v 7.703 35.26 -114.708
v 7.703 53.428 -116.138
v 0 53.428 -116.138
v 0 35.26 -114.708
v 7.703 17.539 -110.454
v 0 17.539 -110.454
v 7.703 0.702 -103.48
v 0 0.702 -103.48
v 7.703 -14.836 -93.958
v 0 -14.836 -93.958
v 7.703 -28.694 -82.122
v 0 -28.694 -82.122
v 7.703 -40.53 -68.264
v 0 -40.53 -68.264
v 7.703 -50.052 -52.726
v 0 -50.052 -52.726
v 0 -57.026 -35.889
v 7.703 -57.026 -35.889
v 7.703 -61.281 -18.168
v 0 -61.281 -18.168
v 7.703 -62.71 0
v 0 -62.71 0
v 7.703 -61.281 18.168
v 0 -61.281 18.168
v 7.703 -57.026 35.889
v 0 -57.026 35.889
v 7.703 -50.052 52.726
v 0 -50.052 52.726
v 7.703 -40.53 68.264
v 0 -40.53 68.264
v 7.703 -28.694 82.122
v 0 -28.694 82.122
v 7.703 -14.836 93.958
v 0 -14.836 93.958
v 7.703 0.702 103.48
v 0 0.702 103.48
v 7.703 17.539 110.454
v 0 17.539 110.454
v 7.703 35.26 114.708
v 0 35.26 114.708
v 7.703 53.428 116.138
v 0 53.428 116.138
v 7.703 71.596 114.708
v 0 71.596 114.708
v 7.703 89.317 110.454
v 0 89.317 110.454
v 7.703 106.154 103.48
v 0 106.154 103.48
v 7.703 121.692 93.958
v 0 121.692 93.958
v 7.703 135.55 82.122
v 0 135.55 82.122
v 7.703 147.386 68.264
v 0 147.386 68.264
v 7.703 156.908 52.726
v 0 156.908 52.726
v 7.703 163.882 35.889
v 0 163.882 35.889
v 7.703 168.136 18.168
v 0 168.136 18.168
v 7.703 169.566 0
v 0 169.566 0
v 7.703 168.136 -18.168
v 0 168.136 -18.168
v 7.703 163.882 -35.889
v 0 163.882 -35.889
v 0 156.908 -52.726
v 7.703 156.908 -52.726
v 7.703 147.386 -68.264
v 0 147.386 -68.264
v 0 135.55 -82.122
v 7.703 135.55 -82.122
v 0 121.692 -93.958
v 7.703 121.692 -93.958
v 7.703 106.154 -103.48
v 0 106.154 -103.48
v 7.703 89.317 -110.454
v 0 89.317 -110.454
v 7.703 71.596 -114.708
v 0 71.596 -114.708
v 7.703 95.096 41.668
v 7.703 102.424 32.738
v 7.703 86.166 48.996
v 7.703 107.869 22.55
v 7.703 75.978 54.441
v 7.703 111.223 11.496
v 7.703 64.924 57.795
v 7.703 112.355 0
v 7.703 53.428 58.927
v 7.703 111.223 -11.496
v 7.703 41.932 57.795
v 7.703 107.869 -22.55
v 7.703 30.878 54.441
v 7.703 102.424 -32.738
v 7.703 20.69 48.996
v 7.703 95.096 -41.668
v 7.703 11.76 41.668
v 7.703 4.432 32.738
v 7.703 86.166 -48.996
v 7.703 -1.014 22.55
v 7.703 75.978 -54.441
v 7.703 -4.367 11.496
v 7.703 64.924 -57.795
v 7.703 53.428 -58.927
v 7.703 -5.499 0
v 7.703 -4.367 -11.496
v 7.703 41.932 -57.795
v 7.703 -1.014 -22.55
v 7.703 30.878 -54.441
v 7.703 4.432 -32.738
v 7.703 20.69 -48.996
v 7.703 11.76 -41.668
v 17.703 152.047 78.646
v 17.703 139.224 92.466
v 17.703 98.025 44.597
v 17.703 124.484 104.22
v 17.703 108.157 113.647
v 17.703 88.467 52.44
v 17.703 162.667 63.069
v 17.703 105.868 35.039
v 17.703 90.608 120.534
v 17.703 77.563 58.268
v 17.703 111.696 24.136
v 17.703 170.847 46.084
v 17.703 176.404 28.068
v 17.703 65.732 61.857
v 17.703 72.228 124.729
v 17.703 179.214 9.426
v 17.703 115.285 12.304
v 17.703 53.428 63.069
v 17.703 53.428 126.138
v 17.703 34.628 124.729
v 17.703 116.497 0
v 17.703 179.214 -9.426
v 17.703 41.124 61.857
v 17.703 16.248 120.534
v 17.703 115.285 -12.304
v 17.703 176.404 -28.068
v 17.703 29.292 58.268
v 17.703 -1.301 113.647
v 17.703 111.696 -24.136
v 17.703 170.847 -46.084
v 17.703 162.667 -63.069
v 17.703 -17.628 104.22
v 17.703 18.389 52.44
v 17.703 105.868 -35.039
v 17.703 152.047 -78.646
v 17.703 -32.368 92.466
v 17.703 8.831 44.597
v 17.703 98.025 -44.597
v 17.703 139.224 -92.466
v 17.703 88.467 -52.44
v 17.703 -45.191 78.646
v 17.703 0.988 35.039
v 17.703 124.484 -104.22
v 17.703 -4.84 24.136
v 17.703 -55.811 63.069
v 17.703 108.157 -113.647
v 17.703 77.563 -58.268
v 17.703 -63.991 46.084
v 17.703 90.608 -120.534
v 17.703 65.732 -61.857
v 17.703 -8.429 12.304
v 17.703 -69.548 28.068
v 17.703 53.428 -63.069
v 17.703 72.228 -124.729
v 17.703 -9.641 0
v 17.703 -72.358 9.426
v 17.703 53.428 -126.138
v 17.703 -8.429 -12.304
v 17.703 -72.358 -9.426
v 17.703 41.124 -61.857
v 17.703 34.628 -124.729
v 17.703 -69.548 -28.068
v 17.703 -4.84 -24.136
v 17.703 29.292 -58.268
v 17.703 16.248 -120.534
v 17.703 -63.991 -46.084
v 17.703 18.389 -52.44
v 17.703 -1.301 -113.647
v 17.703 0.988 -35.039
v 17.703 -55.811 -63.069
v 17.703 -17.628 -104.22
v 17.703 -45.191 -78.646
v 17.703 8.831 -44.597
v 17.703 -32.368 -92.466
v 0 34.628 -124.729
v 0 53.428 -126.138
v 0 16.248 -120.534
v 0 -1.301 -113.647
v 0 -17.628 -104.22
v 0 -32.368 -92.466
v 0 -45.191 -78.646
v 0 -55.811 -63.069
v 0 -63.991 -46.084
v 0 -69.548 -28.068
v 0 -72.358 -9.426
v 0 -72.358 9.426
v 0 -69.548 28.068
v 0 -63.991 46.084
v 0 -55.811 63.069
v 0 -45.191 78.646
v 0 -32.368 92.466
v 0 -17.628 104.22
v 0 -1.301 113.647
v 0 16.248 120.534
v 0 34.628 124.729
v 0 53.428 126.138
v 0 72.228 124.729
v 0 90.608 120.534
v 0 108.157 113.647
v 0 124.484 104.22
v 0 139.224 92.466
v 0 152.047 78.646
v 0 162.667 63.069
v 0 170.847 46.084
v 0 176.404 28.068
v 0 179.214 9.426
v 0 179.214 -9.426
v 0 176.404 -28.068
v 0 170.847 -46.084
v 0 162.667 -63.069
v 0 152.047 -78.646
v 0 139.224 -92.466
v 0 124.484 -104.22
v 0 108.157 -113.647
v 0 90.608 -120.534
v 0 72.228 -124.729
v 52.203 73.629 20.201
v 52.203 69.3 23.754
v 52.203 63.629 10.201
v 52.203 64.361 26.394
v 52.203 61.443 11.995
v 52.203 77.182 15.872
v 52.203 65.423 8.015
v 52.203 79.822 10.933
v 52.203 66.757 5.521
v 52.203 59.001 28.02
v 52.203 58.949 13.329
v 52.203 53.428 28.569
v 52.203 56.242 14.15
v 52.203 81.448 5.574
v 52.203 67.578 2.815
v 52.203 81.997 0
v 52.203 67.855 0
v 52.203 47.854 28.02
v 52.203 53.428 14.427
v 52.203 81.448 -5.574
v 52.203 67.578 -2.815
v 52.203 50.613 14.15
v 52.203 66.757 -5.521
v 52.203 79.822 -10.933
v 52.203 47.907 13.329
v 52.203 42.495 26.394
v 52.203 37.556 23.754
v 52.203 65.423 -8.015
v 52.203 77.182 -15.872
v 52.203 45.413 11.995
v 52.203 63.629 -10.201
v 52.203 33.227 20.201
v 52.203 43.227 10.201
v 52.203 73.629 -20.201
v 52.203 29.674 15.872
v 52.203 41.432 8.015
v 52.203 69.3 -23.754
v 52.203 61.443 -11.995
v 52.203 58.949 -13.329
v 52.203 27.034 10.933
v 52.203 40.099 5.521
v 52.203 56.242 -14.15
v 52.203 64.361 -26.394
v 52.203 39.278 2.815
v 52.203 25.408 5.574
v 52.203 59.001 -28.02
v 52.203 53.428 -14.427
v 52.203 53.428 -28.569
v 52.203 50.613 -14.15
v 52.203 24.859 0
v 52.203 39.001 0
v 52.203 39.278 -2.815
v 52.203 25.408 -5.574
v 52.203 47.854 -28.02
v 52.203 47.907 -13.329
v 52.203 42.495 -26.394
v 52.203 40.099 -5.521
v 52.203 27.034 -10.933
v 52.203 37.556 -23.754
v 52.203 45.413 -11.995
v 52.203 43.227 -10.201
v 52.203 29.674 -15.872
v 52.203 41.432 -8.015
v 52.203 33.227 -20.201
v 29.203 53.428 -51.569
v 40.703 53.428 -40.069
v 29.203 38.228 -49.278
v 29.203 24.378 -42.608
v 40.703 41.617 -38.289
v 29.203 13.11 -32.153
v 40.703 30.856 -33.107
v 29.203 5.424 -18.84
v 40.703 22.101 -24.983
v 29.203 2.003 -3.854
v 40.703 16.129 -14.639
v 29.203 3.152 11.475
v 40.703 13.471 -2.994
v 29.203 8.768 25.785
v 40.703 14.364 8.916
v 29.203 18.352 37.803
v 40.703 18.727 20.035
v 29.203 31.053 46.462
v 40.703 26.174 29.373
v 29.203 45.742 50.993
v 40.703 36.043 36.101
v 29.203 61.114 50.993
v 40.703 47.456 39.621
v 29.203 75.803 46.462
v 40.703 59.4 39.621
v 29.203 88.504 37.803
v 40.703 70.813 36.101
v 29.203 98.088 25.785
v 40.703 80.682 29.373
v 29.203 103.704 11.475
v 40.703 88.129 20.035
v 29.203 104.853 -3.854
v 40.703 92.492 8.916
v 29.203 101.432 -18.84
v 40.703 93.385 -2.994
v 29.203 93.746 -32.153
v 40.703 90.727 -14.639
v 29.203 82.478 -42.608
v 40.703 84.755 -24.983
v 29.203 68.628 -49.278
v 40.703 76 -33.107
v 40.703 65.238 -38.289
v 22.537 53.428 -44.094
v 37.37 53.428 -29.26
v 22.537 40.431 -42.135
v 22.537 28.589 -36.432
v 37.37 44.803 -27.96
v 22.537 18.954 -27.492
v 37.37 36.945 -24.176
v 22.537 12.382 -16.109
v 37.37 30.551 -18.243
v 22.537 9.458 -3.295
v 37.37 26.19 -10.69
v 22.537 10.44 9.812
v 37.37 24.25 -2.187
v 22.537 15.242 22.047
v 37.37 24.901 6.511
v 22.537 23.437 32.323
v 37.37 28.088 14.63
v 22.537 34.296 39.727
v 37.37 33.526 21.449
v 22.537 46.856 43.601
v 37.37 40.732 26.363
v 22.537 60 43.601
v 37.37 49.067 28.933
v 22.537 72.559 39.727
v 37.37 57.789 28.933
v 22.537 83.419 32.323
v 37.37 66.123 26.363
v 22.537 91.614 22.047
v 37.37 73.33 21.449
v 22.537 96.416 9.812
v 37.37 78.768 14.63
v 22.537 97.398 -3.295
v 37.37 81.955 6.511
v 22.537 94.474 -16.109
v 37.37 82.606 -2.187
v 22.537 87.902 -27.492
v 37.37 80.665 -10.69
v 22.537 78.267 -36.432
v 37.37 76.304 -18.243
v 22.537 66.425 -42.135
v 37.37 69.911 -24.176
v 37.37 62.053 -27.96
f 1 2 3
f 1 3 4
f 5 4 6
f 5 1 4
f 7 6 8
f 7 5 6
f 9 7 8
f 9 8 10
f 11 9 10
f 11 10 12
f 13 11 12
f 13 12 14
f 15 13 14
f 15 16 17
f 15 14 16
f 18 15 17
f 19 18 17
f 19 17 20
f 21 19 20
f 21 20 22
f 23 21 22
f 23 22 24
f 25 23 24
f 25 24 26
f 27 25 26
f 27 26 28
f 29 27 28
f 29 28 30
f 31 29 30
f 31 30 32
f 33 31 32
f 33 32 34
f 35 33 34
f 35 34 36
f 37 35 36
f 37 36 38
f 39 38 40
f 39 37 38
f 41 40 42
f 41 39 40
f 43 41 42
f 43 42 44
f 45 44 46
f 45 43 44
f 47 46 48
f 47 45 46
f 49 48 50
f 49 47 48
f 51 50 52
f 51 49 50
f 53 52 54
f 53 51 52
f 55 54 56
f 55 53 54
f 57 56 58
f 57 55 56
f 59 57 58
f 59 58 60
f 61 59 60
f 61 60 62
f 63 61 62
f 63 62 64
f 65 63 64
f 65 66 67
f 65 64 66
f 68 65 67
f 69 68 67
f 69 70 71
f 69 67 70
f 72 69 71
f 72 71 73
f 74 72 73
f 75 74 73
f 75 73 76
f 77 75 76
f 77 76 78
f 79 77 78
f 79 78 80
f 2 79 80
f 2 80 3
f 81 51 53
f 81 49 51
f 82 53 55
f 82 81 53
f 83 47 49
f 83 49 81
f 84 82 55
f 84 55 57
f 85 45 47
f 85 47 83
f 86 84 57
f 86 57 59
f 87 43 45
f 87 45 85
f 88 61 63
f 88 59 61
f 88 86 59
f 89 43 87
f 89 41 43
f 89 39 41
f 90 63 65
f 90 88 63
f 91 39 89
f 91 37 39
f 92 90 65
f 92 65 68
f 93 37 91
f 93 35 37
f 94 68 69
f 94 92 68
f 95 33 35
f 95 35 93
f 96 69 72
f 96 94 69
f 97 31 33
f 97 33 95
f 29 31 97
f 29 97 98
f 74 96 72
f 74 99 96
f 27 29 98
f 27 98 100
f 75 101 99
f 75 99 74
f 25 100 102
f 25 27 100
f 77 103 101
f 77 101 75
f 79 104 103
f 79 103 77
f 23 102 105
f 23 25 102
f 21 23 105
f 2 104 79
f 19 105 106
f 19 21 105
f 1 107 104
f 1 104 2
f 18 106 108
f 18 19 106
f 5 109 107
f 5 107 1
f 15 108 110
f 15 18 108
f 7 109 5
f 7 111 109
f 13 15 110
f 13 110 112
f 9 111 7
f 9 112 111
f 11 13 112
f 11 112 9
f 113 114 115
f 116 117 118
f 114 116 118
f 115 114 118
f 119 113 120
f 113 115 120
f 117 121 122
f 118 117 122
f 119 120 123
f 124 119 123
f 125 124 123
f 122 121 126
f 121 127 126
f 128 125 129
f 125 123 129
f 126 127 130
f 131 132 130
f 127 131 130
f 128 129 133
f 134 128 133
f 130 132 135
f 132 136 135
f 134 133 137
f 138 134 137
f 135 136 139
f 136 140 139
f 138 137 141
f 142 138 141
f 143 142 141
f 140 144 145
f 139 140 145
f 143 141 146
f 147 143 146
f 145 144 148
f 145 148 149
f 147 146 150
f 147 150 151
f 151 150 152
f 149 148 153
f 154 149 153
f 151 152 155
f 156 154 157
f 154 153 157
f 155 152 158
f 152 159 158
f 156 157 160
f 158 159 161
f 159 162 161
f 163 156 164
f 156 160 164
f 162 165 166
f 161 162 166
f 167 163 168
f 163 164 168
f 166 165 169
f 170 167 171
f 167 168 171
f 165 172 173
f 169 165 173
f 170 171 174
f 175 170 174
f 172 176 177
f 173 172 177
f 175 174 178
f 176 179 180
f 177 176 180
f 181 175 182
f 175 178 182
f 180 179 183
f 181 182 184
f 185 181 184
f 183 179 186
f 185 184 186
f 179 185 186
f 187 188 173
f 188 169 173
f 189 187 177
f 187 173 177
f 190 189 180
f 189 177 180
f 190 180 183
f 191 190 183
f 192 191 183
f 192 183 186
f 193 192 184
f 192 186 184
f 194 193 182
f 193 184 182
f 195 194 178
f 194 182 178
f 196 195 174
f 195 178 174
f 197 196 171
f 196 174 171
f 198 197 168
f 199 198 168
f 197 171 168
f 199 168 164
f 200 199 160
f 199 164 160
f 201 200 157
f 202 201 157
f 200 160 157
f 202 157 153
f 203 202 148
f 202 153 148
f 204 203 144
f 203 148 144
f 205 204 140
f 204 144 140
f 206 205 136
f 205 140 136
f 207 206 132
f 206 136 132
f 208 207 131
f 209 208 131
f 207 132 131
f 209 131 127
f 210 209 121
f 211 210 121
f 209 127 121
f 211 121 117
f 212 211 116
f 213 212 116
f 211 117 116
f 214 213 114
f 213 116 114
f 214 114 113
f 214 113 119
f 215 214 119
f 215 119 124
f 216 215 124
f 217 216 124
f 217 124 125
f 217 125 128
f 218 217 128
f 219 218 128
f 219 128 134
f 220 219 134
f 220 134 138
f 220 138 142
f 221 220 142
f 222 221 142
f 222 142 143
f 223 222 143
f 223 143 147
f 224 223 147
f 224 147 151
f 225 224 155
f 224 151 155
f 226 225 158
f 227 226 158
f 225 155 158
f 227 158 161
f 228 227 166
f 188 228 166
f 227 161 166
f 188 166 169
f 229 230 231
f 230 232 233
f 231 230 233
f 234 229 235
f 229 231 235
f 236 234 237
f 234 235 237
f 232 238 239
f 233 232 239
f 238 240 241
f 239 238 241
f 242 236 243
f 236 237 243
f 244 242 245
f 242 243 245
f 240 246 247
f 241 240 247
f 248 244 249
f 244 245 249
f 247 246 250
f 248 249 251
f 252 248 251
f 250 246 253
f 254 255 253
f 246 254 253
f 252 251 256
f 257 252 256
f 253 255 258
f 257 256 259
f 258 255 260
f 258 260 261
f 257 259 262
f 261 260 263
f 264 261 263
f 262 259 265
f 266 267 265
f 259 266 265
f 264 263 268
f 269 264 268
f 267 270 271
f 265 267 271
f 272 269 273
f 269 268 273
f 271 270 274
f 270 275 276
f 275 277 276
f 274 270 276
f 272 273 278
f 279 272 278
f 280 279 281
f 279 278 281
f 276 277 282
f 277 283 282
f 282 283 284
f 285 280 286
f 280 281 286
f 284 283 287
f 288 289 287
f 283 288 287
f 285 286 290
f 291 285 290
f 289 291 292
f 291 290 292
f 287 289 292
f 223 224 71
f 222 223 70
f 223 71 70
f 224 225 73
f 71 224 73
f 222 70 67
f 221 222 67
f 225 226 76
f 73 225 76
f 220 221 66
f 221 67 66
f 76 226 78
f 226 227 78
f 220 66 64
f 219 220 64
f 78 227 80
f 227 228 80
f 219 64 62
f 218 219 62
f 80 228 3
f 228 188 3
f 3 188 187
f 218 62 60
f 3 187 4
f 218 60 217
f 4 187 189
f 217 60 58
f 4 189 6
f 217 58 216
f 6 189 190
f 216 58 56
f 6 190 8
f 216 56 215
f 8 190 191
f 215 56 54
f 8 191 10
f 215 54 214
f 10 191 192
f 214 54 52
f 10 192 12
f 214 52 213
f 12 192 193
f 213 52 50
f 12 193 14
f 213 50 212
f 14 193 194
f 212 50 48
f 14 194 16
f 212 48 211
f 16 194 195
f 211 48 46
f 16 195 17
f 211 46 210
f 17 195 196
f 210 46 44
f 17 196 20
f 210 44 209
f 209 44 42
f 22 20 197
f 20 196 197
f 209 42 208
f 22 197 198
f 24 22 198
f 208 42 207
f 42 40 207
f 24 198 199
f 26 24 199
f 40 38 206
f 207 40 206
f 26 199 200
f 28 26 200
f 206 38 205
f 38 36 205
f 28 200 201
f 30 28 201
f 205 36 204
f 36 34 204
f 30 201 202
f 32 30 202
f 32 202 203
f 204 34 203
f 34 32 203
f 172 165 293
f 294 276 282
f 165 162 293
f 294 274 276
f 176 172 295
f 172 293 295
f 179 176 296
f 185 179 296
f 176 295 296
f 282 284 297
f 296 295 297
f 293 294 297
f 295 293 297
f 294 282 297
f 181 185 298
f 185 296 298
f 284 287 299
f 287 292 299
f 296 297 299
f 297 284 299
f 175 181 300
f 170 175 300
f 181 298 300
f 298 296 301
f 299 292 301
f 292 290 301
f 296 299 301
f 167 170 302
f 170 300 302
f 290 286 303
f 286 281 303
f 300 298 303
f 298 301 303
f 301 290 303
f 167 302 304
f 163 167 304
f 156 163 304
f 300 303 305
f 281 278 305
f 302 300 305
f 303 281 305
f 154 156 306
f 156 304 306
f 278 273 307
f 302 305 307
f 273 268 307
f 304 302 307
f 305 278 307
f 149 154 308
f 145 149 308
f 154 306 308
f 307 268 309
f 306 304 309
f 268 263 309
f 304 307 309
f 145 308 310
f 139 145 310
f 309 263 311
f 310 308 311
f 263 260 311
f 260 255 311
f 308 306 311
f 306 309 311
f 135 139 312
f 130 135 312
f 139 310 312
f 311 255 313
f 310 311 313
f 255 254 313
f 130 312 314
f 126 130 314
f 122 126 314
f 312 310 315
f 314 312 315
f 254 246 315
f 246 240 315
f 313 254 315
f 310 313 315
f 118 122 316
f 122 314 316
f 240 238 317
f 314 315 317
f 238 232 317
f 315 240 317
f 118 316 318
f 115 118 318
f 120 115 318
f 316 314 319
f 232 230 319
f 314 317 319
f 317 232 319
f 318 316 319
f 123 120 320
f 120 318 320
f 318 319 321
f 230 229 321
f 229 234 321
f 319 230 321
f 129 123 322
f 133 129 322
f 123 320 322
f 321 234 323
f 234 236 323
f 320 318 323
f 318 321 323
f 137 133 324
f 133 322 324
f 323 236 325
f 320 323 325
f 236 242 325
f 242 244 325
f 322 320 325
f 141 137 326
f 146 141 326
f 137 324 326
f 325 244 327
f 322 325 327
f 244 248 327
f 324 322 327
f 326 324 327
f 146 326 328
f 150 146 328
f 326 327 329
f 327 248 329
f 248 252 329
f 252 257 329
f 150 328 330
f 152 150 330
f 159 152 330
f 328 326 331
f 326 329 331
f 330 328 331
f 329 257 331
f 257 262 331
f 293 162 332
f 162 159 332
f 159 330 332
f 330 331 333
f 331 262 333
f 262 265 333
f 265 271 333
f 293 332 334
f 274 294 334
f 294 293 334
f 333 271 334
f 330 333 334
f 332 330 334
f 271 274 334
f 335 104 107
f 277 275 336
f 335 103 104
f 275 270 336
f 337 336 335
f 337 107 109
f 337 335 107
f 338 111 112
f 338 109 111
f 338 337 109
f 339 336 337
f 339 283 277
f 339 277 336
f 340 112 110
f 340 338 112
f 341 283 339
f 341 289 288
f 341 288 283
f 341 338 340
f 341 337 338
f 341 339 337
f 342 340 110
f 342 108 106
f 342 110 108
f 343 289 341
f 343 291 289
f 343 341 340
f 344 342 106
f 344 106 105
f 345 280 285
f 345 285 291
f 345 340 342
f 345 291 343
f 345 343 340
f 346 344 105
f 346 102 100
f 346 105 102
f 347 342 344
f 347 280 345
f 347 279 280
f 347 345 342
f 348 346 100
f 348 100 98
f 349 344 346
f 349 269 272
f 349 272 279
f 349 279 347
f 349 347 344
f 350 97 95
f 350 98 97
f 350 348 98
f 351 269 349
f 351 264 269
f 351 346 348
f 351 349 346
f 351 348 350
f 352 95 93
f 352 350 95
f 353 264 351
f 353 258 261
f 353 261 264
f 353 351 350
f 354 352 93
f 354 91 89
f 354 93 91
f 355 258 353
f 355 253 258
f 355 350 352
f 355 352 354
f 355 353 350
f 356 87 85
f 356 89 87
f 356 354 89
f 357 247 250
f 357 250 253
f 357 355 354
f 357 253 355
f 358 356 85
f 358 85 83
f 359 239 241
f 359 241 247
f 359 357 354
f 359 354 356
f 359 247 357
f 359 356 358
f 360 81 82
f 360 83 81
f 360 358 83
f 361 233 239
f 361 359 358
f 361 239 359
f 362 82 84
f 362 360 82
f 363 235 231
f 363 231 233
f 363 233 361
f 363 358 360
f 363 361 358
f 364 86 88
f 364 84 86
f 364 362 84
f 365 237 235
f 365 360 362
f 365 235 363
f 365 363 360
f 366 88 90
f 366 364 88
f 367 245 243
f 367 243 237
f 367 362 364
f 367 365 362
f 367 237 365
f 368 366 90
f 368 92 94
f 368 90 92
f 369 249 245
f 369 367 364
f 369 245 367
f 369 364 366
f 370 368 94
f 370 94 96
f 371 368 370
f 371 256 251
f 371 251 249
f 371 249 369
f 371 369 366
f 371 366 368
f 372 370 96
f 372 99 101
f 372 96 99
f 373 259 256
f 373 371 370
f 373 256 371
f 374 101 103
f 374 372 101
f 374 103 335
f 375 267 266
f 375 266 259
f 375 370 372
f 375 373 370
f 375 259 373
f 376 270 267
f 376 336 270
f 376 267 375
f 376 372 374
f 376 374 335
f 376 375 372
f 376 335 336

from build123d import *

# Parameters (mm, degrees)
VACIADO1_T = -10


with BuildPart() as part:
    # Croquis1 → Revolución1 (revolve)
    with BuildSketch(Plane.XY, mode=Mode.PRIVATE) as revoluci_n1_sk:
        Polygon((0, 53.427911052), (0, -72.710427761), (17.703234608, -72.710427761), (17.703234608, -9.641258354), (52.203454236, 24.858961274), (52.203454236, 53.427911052), align=None)
    revolve(revoluci_n1_sk.sketch.rotate(Axis((52.203454236, 53.427911052, 0), (-1, 0, 0)), 270), axis=Axis((52.203454236, 53.427911052, 0), (-1, 0, 0)))

    # Vaciado1
    vaciado1_openings = [part.faces().sort_by_distance(p)[0] for p in [
        (52.203454236, 53.427911052, 0),
        (0, 53.427911052, 0),
    ]]
    offset(amount=VACIADO1_T, openings=vaciado1_openings, kind=Kind.INTERSECTION)


solid = part.part
